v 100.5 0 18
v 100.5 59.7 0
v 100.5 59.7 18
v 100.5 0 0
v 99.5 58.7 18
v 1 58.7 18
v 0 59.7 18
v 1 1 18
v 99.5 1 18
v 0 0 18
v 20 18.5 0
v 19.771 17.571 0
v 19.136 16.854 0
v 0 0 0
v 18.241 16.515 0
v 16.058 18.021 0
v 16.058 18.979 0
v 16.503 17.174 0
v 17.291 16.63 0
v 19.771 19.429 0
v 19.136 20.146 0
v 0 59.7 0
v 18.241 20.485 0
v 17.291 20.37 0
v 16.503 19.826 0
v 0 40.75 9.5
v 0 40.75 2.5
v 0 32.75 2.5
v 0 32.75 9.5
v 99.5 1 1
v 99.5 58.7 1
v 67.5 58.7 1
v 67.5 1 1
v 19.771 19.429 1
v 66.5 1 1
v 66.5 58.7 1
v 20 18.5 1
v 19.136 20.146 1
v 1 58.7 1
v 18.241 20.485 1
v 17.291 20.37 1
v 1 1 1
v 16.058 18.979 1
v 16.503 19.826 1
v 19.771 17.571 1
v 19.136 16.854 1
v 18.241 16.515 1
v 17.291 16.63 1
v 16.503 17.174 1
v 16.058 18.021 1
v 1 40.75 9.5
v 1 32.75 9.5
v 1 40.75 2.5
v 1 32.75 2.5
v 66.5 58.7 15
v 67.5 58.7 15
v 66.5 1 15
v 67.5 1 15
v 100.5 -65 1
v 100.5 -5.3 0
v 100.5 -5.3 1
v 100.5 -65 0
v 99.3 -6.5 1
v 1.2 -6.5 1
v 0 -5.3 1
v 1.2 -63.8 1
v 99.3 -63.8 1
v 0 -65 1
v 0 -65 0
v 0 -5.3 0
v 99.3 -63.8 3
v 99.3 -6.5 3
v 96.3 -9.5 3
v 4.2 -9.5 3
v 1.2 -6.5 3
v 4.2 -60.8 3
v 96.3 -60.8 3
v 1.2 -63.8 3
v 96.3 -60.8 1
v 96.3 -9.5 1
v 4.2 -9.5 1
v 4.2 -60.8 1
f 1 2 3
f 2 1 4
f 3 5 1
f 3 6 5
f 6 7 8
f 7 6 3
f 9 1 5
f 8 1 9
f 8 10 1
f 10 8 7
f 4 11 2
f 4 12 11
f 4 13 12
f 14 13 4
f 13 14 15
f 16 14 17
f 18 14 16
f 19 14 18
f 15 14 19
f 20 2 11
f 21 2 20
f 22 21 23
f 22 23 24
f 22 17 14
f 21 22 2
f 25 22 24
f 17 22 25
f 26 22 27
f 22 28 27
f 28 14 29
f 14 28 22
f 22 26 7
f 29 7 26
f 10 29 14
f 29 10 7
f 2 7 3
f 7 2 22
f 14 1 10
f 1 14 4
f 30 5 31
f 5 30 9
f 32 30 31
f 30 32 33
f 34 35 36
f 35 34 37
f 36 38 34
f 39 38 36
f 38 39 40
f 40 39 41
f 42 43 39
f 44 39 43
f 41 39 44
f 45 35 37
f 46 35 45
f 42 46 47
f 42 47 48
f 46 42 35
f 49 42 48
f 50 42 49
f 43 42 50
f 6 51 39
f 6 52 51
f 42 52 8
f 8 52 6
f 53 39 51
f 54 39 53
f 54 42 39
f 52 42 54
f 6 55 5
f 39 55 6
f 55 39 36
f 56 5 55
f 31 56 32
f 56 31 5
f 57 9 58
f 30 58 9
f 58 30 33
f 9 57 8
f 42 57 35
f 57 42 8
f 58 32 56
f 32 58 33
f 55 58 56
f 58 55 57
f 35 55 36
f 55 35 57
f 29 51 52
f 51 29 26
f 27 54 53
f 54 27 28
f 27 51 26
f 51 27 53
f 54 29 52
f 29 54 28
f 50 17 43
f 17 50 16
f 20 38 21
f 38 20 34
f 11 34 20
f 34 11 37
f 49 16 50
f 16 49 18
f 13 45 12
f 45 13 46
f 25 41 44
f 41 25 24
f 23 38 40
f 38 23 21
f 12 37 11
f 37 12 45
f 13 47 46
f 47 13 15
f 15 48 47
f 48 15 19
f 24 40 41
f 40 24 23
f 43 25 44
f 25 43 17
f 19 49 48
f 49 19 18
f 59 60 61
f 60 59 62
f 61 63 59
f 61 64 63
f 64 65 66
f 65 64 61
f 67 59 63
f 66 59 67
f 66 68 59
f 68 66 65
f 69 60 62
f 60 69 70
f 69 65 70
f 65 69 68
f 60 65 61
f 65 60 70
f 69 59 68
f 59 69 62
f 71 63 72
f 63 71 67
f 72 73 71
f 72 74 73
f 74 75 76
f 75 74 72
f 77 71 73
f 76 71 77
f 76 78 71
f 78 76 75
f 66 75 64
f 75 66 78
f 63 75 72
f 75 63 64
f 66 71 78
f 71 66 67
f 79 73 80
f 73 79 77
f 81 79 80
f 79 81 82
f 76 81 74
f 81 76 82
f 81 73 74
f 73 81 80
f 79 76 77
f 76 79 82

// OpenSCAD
// OpenSCAD code to render an emonTX (http://openenergymonitor.org/emon/)

//Author: Sunil Tagore
// Date: 2/7/13

/*
    This program is free software: you can redistribute it and/or modify
    it under the terms of the GNU General Public License as published by
    the Free Software Foundation, either version 3 of the License, or any later version.

    This program is distributed in the hope that it will be useful,
    but WITHOUT ANY WARRANTY; without even the implied warranty of
    MERCHANTABILITY or FITNESS FOR A PARTICULAR PURPOSE.  See the
    GNU General Public License for more details.

    see <http://www.gnu.org/licenses/>.
*/


// CONNECTOR HOLES : set to 0 or 1 according to your box requirements.

CT1=1;
CT2=0;
CT3=0;
USB_POWER=0;
AC_JACK=0;
TEMP=0;
PULSE=0;
LED_HOLE=1;

// BOX LID : set to 0 if not required, or 1 if required

BOX_LID=1;



// ===================================================
// ===================================================

interior_extra_space=1.7;  // increase board size for smoother fit  // note that this may not scale the connector holes..
  													// ...and led hole correctly. first attempt set at 0.7mm
												// second attempt=2.2
												// 3rd attempt 1.7mm
									
board_width=56+interior_extra_space;			
board_length=63.8+interior_extra_space;		// first attempt was 63.3mm


battery_compartment_width=32;			// 32mm to accomodate battery holder
									//29.5mm second attempt: snug fit (for no battery holder)
									//first attempt 29mm (too small)
									// zero for no battery compartment
partition_wall_width=1;				// partition wall thickness for battery compartment

box_wall_thickness=1;			// 1.5 ish should be fine 
box_base_thickness=1;			// 1.5 ish should be fine 

box_height=17+box_base_thickness;		// 14mm AA battery height + indentation of lid (2mm ish) + gap (1mm) = 17mm
										// this can be varied if needed.

interior_box_width= board_width;
interior_box_length= board_length+battery_compartment_width+partition_wall_width;

exterior_box_width = board_width+(2*(box_wall_thickness));
exterior_box_length = board_length+battery_compartment_width+partition_wall_width+(2*(box_wall_thickness));


// -------------------------------------------------------------------------------
// box


difference(){			// to make box holes


	union(){			// union of partition and main box

		difference(){												// main box walls
		cube([exterior_box_length,exterior_box_width,box_height]);

			translate([box_wall_thickness, box_wall_thickness,box_base_thickness])
			{
			cube([interior_box_length,interior_box_width,box_height]);
			}

		}

	translate([box_wall_thickness+board_length,0,0])				// partition wall
	{
	cube([partition_wall_width,board_width+(2*box_wall_thickness),box_height-3]);
	}

	
	//translate([board_length+box_wall_thickness,55,0])			//55.2 to be precise
	//{
	//cube([battery_compartment_width+partition_wall_width+box_wall_thickness,partition_wall_width,box_height-3]);		//battery length partition	
	//}
	}


if(CT1==1){
translate([0,31+0.75+box_wall_thickness,1.5+box_base_thickness])		//1.5mm from base in z dir, //CT1
{																	
cube([20,8,7]);
}
}


if(CT2==1){
translate([0,22+box_wall_thickness,1.5+box_base_thickness])			//CT2
{
cube([20,7,7]);
}
}

if(CT3==1){
translate([0,12+box_wall_thickness,1.5+box_base_thickness])			//CT3
{
cube([20,7,7]);
}
}

if(USB_POWER==1){
translate([29+box_wall_thickness,interior_box_width,1.5+box_base_thickness])			// usb power
{
cube([10,20,7]);
}
}

if(AC_JACK==1){
translate([49+box_wall_thickness,-5,1.5+box_base_thickness])			// jack power // first attempt 48mm (x)
{
cube([10,20,7]);
}
}

if(TEMP==1){
translate([36+box_wall_thickness,-5,1.5+box_base_thickness])			// Temp // first attempt 35mm (x)
{
cube([7,20,7]);
}
}

if(PULSE==1){
translate([25+box_wall_thickness,-5,1.5+box_base_thickness])			// Pulse counter // first attempt 24(x)
{
cube([7,20,7]);
}
}

if(LED_HOLE==1){	
translate([17+box_wall_thickness,17.5+box_wall_thickness,-5])			//led hole // first attempt: 16.5mm (y)
																// first attempt:15mm (x)
{																	// first attempt: r=1.5mm
cylinder(h=20, r=2, $fs=1);
}
}


}


//-----------------------------------------------------------------------------
// box lid

lid_height = 1;
tolerance = 0.2;		// to get good push fit . first attempt was 0.0mm, 0.4 2nd attempt= too loose, 0.2 3rd attempt.
lip_height = 2;


if(BOX_LID==1){

translate([0,-65,0])
{
	difference(){							// to make lip bit..
		union(){				
		cube([exterior_box_length, exterior_box_width, lid_height]);		//lid
		translate([box_wall_thickness+tolerance,box_wall_thickness+tolerance,lid_height])
		cube([interior_box_length-2*tolerance,interior_box_width-2*tolerance,lip_height]);			// lip cuboid
		}
	translate([box_wall_thickness+3+tolerance,box_wall_thickness+3+tolerance,lid_height])		//3mm lip "width"
	{
	cube([interior_box_length-6-2*tolerance,interior_box_width-6-2*tolerance,lip_height]);			// lip subracted
	}
	}
}

}
